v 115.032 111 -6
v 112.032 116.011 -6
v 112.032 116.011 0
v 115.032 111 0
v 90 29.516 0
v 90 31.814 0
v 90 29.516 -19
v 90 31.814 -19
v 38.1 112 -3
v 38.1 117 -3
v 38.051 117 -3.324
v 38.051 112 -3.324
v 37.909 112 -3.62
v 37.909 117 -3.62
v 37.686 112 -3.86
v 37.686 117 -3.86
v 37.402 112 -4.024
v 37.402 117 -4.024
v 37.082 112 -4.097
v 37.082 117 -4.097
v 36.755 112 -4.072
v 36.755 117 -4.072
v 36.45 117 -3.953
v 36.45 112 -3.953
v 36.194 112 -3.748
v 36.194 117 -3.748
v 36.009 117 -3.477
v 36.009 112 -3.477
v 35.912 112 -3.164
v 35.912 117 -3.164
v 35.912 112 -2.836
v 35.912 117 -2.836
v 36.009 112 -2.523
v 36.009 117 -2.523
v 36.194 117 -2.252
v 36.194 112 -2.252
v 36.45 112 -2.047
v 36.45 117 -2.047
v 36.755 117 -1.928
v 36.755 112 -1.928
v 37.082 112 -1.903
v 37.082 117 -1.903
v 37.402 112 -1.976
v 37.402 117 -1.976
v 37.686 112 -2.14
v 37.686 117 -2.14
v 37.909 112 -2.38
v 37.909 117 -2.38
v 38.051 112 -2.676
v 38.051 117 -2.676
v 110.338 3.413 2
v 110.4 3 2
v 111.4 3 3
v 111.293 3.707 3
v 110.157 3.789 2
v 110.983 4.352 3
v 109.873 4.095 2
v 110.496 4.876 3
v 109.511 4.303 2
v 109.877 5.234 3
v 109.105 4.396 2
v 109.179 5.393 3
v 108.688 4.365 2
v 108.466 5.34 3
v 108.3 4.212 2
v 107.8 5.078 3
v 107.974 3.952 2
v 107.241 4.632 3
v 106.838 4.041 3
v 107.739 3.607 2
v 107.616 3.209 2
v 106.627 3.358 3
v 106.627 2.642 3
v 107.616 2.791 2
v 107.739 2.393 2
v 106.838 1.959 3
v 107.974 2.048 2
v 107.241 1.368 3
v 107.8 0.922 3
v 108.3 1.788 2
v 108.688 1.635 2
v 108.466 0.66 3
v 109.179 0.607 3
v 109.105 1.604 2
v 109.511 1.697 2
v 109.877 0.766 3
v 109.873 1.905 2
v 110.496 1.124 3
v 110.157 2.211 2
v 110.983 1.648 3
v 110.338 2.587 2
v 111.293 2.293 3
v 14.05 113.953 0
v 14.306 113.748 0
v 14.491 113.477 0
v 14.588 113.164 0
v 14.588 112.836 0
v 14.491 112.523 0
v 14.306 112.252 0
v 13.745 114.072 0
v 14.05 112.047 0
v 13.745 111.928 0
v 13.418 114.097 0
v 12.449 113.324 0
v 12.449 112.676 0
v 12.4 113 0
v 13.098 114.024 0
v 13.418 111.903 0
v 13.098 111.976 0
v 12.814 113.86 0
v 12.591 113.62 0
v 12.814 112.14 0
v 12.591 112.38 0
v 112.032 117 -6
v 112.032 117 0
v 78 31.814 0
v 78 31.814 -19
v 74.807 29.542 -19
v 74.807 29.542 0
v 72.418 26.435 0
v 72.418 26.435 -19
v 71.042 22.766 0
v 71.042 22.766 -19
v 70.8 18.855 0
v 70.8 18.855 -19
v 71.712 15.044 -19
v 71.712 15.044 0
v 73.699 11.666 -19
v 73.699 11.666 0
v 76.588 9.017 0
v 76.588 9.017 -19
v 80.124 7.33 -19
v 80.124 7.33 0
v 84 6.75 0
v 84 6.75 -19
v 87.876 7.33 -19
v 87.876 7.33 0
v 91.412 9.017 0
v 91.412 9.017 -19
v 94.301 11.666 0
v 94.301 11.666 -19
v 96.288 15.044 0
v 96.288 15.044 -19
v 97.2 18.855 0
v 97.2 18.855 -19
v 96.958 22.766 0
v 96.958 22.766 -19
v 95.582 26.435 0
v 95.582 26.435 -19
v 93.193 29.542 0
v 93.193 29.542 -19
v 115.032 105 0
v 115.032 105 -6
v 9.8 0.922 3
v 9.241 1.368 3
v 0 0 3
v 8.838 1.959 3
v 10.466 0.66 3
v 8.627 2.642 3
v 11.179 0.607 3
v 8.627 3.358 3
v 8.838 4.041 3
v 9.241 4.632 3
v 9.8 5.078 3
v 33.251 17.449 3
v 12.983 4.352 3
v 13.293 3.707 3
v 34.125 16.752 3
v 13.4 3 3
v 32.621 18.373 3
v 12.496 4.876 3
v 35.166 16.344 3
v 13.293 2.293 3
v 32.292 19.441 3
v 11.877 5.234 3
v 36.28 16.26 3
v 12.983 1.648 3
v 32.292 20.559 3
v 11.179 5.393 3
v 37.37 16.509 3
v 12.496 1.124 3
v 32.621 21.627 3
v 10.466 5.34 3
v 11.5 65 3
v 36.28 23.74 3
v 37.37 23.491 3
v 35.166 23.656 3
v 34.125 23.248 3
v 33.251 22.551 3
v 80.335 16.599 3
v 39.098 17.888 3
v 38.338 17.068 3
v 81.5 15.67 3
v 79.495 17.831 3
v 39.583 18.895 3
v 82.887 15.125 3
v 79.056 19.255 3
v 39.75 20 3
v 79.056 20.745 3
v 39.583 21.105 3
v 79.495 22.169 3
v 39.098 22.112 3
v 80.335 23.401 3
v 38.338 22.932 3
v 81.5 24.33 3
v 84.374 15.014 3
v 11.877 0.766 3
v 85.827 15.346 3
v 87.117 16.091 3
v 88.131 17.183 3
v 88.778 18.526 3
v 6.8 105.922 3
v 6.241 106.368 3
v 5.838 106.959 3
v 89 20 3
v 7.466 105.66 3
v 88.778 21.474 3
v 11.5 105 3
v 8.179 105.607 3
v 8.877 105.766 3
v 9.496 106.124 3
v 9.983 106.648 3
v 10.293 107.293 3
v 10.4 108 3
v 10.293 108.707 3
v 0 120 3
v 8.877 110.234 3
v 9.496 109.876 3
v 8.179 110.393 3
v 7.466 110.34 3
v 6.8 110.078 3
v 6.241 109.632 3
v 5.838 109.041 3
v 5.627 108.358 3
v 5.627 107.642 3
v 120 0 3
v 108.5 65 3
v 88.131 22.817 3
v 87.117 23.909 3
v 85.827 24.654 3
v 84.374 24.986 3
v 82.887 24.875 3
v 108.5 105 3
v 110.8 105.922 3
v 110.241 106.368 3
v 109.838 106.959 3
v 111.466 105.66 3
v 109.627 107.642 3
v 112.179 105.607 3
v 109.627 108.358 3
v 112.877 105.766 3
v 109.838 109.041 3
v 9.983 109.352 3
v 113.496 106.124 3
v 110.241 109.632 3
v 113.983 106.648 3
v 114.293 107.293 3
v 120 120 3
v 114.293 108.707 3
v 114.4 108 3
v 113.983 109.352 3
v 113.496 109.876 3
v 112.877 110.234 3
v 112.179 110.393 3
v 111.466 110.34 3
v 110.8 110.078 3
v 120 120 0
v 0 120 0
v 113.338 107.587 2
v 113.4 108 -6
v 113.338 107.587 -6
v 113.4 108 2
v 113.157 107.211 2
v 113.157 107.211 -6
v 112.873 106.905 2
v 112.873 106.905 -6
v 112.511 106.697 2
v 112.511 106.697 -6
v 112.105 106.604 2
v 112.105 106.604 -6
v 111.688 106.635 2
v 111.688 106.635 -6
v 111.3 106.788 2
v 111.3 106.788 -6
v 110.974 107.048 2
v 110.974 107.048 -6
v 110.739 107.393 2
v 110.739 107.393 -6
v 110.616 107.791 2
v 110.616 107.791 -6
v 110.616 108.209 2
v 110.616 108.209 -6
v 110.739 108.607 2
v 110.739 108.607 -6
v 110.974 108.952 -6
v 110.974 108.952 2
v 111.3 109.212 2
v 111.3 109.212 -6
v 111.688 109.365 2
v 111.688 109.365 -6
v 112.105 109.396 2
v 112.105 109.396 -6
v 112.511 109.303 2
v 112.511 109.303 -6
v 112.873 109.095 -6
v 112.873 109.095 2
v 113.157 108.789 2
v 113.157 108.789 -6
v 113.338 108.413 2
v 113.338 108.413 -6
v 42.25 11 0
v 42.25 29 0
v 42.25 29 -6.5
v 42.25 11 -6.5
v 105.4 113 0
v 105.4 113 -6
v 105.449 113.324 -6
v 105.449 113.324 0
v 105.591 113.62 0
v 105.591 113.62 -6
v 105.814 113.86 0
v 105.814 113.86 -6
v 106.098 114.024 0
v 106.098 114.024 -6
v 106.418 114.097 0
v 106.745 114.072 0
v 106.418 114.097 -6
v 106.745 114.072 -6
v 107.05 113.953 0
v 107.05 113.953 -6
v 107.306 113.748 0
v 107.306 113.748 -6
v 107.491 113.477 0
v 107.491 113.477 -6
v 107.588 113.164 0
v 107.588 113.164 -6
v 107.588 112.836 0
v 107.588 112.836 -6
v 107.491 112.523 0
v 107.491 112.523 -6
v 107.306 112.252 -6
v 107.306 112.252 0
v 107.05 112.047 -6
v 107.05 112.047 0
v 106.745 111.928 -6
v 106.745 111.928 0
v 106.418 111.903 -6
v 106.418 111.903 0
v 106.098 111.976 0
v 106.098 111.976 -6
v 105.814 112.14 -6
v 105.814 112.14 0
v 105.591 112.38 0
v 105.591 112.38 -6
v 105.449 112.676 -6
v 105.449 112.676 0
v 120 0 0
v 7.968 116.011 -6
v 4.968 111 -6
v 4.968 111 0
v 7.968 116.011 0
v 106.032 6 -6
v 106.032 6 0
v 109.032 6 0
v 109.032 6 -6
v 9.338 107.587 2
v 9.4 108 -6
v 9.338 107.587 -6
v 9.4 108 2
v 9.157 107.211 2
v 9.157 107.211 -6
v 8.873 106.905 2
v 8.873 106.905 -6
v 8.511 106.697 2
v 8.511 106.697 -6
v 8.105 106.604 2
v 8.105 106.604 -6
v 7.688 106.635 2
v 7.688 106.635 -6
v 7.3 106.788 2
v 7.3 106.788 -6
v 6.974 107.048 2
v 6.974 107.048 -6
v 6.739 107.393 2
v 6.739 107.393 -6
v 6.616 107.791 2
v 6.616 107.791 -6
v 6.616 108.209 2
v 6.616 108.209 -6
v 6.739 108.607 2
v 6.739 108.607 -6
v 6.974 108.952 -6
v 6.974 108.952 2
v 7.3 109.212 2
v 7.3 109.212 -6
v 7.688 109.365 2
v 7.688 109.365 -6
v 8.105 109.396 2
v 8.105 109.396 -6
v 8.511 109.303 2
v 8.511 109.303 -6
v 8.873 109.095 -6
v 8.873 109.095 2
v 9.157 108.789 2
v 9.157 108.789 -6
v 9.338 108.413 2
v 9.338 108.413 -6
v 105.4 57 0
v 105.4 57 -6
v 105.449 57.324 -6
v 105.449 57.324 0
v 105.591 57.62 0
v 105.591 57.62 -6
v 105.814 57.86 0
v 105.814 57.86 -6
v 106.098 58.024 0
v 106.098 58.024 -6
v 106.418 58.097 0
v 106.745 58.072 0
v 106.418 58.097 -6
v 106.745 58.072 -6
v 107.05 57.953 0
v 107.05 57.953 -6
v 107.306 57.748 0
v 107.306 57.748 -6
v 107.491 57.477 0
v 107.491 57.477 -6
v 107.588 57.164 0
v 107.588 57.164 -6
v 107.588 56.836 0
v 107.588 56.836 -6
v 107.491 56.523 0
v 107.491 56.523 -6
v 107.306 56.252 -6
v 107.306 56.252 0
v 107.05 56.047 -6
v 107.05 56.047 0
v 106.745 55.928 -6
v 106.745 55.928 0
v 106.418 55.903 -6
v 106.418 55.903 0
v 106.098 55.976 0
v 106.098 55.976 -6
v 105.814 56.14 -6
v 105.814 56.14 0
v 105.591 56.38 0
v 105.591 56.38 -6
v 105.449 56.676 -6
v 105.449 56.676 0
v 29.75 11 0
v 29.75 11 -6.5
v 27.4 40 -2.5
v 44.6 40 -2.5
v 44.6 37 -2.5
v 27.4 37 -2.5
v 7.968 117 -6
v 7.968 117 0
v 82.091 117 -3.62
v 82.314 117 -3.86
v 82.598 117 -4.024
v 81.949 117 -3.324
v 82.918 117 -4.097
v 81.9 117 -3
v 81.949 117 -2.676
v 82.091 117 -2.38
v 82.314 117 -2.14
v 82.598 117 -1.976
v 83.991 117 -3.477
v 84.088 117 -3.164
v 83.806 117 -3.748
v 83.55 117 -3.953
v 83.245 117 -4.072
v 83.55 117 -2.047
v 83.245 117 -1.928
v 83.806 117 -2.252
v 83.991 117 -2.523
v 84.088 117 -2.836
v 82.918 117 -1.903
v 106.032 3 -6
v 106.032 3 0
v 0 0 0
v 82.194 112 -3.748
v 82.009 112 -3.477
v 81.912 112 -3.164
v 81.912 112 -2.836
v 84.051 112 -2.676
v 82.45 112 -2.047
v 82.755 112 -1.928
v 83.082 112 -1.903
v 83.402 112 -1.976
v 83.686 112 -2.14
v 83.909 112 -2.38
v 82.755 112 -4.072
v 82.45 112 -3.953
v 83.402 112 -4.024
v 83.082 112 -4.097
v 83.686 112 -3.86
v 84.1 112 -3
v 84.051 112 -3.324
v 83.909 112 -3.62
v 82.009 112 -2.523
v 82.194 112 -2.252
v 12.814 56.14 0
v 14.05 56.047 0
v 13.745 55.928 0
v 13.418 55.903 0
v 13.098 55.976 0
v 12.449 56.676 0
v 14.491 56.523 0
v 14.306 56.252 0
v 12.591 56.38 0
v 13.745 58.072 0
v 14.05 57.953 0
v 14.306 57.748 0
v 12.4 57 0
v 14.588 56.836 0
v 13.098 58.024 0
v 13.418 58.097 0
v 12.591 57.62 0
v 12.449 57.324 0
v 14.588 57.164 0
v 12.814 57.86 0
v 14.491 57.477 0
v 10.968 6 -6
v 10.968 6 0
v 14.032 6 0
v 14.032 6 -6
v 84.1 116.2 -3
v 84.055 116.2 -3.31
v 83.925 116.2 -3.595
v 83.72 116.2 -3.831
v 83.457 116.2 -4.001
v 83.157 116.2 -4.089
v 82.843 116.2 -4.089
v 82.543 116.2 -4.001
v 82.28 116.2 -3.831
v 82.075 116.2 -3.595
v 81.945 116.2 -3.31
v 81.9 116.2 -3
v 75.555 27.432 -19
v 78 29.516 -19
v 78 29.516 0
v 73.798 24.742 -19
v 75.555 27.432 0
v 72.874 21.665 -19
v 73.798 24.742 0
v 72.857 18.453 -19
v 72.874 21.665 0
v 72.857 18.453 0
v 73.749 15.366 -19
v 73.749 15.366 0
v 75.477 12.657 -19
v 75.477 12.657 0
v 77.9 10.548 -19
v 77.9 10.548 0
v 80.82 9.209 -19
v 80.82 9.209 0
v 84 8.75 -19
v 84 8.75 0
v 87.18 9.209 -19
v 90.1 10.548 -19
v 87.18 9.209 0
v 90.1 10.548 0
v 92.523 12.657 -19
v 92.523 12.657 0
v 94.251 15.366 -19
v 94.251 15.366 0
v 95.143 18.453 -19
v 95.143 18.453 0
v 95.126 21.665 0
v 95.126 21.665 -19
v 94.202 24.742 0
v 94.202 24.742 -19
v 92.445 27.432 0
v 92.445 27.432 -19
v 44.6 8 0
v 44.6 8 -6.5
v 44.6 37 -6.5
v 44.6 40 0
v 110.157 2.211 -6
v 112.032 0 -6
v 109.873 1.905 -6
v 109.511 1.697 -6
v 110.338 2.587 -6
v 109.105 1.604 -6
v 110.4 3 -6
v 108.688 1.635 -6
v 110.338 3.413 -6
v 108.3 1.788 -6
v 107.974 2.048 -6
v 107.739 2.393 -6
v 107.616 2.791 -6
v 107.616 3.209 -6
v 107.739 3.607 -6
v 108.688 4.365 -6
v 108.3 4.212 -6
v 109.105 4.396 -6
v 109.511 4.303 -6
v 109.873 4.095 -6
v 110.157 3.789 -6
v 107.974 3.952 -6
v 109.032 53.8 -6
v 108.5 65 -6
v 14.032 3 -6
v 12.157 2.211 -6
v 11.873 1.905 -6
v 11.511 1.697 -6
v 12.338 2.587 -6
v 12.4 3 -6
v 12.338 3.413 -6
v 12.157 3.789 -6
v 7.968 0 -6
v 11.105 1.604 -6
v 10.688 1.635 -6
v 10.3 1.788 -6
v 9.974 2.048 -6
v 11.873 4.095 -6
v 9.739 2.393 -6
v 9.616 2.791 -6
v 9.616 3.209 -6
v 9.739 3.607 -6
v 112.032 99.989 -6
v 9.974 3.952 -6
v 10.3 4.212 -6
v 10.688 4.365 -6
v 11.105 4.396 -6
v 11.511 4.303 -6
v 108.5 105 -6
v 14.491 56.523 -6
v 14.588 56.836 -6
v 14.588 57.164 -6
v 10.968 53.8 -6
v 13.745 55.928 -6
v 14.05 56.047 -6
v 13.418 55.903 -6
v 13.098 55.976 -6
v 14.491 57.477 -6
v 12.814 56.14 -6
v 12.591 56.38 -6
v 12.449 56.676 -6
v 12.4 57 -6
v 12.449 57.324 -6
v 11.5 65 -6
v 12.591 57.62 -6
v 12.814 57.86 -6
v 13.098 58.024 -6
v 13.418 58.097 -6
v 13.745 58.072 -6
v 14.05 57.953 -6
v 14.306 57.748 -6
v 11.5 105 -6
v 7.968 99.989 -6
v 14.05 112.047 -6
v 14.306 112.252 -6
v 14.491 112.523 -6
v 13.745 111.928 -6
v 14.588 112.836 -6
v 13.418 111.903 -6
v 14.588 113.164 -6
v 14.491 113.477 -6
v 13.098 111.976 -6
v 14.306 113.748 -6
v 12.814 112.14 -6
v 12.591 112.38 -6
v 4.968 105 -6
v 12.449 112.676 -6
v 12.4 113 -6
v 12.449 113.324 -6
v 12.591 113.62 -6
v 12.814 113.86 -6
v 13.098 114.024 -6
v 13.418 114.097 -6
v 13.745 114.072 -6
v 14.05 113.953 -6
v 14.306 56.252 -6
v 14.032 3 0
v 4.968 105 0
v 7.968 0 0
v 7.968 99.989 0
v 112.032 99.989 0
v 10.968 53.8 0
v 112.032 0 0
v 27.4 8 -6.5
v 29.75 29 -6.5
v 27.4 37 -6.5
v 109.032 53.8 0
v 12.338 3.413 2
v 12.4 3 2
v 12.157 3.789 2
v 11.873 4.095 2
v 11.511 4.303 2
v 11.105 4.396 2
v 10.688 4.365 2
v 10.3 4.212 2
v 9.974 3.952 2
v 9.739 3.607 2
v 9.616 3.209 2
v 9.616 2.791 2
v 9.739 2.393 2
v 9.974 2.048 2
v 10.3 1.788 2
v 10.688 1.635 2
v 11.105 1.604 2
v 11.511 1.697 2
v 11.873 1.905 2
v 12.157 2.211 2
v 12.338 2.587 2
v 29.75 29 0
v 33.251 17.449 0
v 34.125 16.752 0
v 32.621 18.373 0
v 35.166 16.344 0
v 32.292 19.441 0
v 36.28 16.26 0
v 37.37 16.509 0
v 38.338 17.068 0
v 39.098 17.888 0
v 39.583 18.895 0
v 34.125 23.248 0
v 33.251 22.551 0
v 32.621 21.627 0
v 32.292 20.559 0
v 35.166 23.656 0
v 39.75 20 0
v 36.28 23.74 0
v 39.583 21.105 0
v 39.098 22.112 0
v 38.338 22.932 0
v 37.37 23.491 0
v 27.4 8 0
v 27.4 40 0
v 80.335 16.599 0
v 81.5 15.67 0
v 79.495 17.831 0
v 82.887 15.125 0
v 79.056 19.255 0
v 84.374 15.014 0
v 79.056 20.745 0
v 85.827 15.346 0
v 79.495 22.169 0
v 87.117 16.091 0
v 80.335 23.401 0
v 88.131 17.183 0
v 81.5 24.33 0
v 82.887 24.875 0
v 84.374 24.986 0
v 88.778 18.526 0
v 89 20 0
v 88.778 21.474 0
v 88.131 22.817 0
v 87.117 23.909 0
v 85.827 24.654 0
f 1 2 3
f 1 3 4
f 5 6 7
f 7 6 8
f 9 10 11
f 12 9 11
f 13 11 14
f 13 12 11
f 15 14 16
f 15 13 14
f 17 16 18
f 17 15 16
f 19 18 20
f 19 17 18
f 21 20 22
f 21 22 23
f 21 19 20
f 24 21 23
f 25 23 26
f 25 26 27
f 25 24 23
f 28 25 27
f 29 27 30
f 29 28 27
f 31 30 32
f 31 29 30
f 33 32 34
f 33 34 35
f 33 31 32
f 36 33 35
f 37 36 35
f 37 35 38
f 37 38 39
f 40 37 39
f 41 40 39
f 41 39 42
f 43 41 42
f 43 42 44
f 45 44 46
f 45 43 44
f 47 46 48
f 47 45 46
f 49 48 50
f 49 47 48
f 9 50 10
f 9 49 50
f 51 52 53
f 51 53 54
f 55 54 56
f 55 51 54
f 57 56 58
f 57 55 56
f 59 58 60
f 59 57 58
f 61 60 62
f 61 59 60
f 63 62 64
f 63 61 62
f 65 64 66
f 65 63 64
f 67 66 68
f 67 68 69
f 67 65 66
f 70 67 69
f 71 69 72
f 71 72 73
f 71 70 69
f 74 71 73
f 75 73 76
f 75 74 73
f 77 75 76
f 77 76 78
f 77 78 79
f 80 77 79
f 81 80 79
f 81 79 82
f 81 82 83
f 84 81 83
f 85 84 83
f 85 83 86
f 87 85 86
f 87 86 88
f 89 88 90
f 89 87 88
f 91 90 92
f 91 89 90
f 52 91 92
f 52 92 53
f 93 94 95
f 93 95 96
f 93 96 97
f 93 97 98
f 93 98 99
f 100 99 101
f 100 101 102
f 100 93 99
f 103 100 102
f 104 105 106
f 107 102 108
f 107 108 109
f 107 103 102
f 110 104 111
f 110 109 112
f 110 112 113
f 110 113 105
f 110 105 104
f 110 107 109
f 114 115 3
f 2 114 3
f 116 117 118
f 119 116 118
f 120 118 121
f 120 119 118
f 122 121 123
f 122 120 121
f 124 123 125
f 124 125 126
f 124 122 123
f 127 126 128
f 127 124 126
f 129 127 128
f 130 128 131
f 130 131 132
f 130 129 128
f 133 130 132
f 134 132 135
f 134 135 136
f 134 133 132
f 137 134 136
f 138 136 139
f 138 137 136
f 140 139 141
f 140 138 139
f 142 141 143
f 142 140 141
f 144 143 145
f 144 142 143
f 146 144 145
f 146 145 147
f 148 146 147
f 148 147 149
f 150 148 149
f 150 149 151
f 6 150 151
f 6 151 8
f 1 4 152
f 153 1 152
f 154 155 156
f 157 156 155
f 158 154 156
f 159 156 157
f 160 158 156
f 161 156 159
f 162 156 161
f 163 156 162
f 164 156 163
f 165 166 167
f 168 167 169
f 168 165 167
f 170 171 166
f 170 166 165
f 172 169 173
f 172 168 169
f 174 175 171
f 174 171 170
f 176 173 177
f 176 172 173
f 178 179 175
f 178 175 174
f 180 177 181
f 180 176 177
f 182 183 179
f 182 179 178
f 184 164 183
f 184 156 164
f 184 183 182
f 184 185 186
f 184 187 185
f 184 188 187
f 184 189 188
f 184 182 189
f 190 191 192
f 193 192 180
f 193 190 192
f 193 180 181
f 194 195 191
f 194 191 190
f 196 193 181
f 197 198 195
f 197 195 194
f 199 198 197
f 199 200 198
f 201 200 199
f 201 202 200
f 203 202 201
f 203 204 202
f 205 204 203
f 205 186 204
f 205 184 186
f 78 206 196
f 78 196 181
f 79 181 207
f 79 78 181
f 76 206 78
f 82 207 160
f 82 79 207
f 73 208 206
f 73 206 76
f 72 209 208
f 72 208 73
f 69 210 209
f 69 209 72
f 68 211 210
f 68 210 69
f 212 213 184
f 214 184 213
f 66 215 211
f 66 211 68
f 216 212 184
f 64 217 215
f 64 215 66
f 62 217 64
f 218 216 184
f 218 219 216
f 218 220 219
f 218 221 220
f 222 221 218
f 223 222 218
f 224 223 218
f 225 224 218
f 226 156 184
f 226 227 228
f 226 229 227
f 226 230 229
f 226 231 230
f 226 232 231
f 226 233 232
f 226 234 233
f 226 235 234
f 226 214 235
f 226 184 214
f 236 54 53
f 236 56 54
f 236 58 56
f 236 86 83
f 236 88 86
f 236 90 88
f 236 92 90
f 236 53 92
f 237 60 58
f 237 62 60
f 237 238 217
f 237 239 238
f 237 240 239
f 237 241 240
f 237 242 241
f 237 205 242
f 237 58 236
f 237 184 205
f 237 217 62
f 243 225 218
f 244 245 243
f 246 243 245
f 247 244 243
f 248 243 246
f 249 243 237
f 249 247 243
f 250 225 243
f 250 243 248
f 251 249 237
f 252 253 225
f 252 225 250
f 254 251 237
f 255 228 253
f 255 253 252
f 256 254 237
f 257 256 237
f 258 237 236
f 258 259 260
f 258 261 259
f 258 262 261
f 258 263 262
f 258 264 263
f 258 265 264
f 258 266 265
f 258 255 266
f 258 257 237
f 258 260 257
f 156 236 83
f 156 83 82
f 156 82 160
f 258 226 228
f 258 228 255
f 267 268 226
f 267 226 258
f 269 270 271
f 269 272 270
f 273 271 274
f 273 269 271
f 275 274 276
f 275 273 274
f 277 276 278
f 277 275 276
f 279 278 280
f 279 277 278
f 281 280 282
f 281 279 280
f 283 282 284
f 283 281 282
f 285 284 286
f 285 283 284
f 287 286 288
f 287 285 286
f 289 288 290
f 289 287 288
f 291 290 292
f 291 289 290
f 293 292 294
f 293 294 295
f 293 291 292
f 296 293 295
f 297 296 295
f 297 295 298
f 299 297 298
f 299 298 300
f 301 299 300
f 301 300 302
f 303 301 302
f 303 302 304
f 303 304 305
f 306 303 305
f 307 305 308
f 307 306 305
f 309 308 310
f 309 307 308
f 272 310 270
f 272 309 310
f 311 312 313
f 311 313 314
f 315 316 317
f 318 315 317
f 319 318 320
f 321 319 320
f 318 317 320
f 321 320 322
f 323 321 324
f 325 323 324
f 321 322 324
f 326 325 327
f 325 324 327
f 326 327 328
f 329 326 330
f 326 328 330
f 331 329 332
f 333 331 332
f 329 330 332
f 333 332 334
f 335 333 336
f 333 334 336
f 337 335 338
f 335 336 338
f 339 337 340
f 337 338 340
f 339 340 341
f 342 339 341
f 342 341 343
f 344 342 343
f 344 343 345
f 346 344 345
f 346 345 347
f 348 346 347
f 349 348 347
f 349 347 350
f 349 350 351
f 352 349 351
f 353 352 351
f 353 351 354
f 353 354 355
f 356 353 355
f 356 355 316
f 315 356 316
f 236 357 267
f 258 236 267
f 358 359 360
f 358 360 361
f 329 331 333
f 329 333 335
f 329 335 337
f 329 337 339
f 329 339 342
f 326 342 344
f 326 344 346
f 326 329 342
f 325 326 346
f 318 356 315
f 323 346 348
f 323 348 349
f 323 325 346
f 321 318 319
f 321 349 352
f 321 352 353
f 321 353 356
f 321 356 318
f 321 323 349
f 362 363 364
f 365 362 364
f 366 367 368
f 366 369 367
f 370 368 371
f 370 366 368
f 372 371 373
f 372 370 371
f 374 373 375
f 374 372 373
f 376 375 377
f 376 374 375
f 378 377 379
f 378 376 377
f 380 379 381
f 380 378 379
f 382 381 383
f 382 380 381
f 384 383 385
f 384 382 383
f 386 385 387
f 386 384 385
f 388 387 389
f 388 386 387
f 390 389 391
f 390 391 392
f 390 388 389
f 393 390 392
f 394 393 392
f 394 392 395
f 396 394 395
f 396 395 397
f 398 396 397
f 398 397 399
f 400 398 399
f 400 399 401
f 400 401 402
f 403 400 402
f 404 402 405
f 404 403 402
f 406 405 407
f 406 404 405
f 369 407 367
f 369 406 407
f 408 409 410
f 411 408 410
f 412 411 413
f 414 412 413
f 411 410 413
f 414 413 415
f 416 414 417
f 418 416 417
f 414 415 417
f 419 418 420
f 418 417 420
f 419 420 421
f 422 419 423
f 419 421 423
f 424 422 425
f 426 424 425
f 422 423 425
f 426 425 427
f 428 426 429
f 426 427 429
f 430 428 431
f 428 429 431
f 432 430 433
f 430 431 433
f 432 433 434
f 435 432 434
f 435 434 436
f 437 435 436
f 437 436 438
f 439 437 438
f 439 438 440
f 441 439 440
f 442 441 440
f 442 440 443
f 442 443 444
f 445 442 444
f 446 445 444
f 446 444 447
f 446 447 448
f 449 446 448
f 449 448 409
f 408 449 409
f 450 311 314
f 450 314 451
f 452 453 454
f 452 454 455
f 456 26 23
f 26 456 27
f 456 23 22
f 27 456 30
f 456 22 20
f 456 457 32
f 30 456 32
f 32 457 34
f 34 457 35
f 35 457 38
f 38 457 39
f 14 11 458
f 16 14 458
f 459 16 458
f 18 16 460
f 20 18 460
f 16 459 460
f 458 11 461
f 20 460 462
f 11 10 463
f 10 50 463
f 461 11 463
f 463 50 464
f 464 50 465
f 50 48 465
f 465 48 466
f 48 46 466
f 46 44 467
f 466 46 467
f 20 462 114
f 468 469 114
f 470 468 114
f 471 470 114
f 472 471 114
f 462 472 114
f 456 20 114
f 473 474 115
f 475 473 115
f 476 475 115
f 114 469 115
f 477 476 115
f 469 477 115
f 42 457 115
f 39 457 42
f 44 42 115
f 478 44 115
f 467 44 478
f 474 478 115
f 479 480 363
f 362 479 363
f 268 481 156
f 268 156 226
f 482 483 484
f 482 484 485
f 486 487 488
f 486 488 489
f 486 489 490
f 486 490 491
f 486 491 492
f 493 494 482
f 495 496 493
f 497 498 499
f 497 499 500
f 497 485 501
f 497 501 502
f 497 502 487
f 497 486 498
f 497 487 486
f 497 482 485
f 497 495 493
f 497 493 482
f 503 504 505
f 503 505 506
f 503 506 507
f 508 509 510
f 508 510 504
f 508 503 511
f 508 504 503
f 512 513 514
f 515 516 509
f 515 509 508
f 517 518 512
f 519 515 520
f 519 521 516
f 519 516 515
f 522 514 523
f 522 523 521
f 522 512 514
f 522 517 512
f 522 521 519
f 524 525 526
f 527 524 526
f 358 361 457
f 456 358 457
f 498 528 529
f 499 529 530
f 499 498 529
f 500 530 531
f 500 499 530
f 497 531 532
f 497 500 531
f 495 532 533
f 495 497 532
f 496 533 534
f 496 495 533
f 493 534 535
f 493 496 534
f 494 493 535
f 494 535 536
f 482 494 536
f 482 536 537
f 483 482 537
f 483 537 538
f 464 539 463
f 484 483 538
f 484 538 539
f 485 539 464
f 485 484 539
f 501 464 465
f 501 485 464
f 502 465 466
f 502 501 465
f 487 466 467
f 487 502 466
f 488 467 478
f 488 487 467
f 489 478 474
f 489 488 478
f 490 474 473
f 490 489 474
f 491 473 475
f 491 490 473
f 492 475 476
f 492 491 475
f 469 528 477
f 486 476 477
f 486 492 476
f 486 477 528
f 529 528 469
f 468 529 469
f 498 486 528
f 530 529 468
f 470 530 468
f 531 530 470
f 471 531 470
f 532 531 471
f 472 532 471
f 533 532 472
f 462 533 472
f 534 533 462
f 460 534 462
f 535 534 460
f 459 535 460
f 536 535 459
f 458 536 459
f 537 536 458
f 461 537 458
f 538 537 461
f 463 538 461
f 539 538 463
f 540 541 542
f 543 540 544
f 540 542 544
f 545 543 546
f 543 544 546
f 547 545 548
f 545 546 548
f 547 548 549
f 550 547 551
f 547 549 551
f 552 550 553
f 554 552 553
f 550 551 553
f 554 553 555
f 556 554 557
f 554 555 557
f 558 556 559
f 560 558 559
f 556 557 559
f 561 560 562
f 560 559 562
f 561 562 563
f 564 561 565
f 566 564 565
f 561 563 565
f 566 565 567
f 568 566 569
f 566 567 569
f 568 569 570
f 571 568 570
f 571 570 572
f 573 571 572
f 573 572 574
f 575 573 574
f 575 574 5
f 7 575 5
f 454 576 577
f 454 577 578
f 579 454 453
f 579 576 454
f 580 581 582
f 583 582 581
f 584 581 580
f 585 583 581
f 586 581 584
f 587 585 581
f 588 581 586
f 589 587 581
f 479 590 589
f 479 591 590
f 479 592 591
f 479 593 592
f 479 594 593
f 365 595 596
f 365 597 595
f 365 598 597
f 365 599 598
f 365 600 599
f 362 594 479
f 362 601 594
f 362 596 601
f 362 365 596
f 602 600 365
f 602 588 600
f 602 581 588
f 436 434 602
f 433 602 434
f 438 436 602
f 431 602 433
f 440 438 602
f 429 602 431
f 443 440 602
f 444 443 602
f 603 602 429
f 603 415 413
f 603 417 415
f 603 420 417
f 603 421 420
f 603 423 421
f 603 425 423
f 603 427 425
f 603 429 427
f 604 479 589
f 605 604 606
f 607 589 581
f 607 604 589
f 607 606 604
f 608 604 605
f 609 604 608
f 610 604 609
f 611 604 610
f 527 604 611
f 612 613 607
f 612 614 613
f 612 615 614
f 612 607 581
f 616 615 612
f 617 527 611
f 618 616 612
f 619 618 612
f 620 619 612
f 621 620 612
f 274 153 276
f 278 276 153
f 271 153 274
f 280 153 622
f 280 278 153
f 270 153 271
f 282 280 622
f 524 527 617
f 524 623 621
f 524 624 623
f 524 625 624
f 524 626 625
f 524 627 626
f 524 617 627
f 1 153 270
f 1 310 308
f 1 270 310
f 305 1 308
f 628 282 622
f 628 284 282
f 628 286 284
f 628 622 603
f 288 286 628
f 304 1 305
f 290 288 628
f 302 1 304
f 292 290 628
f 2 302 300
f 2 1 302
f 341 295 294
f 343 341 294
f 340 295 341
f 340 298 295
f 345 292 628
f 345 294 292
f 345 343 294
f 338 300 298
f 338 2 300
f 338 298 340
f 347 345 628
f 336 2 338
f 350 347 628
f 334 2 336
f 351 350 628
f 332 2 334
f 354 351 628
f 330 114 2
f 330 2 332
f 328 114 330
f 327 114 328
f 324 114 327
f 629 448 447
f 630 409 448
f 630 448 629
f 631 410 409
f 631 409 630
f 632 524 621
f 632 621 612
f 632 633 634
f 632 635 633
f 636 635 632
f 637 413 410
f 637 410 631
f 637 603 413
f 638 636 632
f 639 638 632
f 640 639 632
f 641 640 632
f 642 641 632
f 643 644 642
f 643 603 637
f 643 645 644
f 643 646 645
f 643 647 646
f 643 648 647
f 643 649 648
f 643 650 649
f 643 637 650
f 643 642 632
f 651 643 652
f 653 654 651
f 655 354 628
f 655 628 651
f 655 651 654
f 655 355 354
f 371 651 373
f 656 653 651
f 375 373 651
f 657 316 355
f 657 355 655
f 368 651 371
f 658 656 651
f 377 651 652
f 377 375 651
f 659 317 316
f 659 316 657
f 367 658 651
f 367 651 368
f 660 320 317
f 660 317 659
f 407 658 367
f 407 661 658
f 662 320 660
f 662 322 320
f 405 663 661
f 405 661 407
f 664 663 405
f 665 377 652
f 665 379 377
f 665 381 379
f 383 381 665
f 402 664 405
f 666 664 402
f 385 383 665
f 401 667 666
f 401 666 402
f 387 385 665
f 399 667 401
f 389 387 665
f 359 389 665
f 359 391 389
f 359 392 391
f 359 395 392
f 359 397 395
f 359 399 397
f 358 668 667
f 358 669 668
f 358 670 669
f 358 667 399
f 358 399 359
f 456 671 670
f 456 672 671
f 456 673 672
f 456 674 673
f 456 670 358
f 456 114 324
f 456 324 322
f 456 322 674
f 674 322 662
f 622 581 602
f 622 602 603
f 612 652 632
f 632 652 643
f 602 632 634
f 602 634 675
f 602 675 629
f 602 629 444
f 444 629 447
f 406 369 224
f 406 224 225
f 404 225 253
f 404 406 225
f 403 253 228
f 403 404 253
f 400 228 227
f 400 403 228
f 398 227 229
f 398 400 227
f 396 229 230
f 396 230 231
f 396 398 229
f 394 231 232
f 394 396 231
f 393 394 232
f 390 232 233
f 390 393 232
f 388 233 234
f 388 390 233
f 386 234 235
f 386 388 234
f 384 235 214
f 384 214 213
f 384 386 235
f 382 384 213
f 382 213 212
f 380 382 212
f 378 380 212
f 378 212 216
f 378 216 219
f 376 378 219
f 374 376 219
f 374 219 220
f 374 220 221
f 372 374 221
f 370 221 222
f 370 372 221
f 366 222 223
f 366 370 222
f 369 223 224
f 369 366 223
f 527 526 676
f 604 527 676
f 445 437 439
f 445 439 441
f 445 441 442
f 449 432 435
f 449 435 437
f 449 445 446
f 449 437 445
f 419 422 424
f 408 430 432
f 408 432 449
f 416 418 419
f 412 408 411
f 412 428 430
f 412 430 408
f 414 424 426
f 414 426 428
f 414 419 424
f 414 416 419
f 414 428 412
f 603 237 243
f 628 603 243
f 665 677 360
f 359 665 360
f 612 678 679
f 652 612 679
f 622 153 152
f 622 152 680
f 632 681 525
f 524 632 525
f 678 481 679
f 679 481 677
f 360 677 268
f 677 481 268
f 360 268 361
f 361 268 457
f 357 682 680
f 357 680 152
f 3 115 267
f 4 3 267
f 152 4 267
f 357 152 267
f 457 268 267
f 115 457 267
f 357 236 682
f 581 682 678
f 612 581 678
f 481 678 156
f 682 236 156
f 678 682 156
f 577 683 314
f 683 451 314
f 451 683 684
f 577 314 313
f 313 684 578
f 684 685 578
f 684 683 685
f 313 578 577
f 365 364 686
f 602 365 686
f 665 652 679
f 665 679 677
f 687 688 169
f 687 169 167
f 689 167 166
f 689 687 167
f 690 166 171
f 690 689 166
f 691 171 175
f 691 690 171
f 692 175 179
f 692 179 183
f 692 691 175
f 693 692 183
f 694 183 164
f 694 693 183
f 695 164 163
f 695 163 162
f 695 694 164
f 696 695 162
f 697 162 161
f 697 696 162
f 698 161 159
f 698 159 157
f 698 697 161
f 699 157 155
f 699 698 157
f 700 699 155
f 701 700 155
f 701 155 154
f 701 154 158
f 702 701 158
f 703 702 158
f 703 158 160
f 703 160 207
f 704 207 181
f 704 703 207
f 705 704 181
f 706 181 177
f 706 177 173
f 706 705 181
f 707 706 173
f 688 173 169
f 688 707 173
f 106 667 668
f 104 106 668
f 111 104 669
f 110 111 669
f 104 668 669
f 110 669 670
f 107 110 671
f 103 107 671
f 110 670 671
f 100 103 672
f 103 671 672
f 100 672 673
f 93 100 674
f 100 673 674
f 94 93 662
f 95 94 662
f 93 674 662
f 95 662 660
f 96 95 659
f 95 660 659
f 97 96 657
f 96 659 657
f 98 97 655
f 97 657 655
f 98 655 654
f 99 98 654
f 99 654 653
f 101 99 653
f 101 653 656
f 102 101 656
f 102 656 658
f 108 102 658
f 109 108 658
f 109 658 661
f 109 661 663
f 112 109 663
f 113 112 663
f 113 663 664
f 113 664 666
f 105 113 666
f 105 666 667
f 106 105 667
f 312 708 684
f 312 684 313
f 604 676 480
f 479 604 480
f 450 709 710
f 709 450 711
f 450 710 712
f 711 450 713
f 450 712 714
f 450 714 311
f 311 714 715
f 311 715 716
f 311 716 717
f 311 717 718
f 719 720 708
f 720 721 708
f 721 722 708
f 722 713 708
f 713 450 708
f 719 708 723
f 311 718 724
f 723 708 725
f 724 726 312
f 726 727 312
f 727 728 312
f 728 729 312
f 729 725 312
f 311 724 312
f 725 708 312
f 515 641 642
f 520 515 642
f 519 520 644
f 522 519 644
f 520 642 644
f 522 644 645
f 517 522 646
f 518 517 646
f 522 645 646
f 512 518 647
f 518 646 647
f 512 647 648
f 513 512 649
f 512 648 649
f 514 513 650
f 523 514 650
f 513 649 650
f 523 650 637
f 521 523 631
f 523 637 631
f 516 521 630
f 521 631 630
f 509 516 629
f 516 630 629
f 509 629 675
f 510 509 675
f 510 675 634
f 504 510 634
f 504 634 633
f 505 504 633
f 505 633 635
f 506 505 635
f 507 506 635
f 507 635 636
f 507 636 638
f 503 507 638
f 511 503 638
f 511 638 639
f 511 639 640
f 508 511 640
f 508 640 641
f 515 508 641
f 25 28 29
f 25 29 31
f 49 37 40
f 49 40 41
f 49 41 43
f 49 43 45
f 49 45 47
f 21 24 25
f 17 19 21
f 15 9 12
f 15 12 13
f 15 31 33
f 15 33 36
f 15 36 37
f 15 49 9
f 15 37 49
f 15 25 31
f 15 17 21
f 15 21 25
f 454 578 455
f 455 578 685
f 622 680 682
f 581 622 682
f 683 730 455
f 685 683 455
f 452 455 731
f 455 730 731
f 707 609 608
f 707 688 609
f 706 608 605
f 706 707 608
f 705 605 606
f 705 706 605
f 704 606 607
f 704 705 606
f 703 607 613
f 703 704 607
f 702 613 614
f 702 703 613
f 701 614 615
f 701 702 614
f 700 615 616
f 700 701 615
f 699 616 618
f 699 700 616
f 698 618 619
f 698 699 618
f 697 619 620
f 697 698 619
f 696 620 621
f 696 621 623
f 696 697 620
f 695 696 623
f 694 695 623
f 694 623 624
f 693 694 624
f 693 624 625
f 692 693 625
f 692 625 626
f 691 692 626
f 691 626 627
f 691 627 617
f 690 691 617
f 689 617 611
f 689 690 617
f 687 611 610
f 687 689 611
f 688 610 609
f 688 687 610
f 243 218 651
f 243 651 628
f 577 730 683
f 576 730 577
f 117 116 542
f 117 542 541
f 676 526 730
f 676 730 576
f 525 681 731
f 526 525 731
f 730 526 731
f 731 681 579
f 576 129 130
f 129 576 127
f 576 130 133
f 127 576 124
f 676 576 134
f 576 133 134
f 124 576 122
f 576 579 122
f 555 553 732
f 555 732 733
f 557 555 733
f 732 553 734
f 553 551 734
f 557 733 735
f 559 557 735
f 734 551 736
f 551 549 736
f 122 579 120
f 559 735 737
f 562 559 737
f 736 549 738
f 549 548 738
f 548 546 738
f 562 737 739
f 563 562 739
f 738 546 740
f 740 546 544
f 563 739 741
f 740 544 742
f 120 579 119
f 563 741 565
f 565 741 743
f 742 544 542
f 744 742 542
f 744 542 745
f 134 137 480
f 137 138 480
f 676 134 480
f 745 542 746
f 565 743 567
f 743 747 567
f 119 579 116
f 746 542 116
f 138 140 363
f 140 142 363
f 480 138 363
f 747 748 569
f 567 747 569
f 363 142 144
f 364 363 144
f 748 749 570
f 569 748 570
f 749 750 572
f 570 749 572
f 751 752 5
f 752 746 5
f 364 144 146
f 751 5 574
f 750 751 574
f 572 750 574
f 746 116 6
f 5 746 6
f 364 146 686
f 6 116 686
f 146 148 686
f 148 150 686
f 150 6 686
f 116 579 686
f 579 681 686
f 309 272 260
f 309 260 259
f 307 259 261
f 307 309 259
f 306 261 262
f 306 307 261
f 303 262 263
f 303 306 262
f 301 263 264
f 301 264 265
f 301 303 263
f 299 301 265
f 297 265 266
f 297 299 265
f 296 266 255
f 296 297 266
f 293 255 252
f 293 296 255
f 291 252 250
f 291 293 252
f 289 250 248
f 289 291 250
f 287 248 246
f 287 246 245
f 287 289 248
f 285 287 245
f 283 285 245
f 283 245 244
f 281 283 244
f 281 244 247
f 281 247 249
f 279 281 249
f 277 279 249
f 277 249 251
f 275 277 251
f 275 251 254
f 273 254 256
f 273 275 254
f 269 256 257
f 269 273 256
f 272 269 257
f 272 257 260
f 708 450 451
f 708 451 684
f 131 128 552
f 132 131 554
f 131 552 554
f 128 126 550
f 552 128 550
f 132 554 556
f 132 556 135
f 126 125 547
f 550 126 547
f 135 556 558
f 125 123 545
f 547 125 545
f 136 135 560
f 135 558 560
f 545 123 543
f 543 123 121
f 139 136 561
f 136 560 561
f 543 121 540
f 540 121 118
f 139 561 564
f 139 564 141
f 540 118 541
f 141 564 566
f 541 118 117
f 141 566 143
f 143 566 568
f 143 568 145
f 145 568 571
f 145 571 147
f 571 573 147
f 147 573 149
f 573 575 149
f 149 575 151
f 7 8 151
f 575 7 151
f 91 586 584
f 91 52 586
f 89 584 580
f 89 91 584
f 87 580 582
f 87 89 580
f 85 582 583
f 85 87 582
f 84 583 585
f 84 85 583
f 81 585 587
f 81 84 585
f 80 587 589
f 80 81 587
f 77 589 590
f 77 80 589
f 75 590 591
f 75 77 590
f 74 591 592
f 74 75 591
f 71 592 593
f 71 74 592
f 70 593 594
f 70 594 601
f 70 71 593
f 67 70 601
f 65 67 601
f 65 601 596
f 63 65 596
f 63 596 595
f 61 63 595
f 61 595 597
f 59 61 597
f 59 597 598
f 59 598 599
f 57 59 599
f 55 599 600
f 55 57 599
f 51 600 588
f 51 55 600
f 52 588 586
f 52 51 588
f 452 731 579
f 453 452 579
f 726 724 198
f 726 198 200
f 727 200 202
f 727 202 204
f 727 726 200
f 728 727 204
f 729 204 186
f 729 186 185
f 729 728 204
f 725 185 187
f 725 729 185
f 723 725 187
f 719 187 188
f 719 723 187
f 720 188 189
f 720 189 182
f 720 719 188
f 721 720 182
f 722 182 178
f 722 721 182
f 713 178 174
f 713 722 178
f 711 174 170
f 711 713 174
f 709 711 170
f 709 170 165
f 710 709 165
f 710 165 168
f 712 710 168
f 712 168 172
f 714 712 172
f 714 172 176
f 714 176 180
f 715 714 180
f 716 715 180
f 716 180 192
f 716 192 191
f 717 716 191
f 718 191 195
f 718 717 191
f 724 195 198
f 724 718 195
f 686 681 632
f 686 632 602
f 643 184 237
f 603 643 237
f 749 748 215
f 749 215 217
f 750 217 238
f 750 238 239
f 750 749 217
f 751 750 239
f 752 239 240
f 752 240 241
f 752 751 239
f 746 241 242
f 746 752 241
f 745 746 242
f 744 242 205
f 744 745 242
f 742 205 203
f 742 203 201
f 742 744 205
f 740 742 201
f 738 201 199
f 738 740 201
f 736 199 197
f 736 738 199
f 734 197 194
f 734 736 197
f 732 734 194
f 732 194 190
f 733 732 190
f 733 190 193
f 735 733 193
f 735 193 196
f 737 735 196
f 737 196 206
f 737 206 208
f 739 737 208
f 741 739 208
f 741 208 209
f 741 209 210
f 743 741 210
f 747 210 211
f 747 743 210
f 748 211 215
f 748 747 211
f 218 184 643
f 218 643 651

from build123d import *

# Parameters (mm, degrees)
SZKIC1_W                        = 120
SZKIC1_H                        = 120
SZKIC1_R                        = 3.75
SZKIC1_R_2                      = 5
SZKIC1_W_2                      = 97
SZKIC1_H_2                      = 40
DODANIE_WYCI_GNI_CIE1_DEPTH     = 3
SZKIC1_4_W                      = 17.2
SZKIC1_4_H                      = 32
DODANIE_WYCI_GNI_CIE3_DEPTH     = 6.5
SZKIC1_7_W                      = 97
SZKIC1_7_H                      = 40
DODANIE_WYCI_GNI_CIE4_DEPTH     = 7
SZKIC9_W                        = 40
SZKIC9_H                        = 4
WYTNIJ_WYCI_GNI_CIE10_DEPTH     = 1
SZKIC7_R                        = 1.4
WYTNIJ_WYCI_GNI_CIE11_DEPTH     = 10
SZKIC1_8_R                      = 13.25
SZKIC1_8_R_2                    = 11.25
DODANIE_WYCI_GNI_CIE5_DEPTH     = 19
SZKIC11_W                       = 17.2
SZKIC11_H                       = 3
WYTNIJ_WYCI_GNI_CIE13_DEPTH     = 4
SZKIC12_W                       = 12
SZKIC12_H                       = 19
WYTNIJ_WYCI_GNI_CIE14_DEPTH     = 4
SZKIC13_R                       = 1.1
WYTNIJ_WYCI_GNI_CIE15_DEPTH     = 7
SZKIC14_W                       = 6
SZKIC14_H                       = 6
SZKIC14_R                       = 1.1
DODANIE_WYCI_GNI_CIE6_DEPTH     = 0.8
DODANIE_WYCI_GNI_CIE7_DEPTH     = 0.8
SFAZOWANIE1_SIZE                = 1
SFAZOWANIE2_SIZE                = 1
SFAZOWANIE3_SIZE                = 1
SFAZOWANIE4_SIZE                = 1
SZKIC17_R                       = 1.4
DODANIE_WYCI_GNI_CIE9_DEPTH     = 6
SZKIC18_W                       = 99.4
SZKIC18_H                       = 63.2
WYTNIJ_WYCI_GNI_CIE16_DEPTH     = 1
WYTNIJ_WYCI_GNI_CIE17_START     = -5
WYTNIJ_WYCI_GNI_CIE17_OUTLINE_R = 1.1
WYTNIJ_WYCI_GNI_CIE17_DEPTH     = 4.2


# Read off the part's stored shape, not the designer's step: Wytnij-wyciągnięcie17
with BuildPart() as part:
    # Szkic1 → Dodanie-wyciągnięcie1 (new body)
    with BuildSketch(Plane.XY):
        with Locations((60, 60)):
            Rectangle(SZKIC1_W, SZKIC1_H)
        with Locations((36, 20)):
            Circle(SZKIC1_R, mode=Mode.SUBTRACT)
        with Locations((84, 20)):
            Circle(SZKIC1_R_2, mode=Mode.SUBTRACT)
        with Locations((60, 85)):
            Rectangle(SZKIC1_W_2, SZKIC1_H_2, mode=Mode.SUBTRACT)
    extrude(amount=DODANIE_WYCI_GNI_CIE1_DEPTH)

    # Szkic1<7> → Dodanie-wyciągnięcie4 (add)
    # profile 1 of 4: a face of its own
    with BuildSketch(Plane.XY):
        Polygon((11.5, 115), (10.3, 115), (10.3, 55), (11.5, 55), (108.5, 55), (109.7, 55), (109.7, 115), (108.5, 115), align=None)
        with Locations((60, 85)):
            Rectangle(SZKIC1_7_W, SZKIC1_7_H, mode=Mode.SUBTRACT)
    # profile 2 of 4: a face of its own
    with BuildSketch(Plane.XY):
        Polygon((11.5, 115), (10.3, 115), (10.3, 55), (11.5, 55), (108.5, 55), (109.7, 55), (109.7, 115), (108.5, 115), align=None)
        with Locations((60, 85)):
            Rectangle(SZKIC1_7_W, SZKIC1_7_H, mode=Mode.SUBTRACT)
    # profile 3 of 4: a face of its own
    with BuildSketch(Plane.XY):
        Polygon((11.5, 115), (10.3, 115), (10.3, 116.2), (109.7, 116.2), (109.7, 115), (108.5, 115), align=None)
    # profile 4 of 4: a face of its own
    with BuildSketch(Plane.XY):
        Polygon((10.3, 53.8), (109.7, 53.8), (109.7, 55), (108.5, 55), (11.5, 55), (10.3, 55), align=None)
    extrude(amount=-DODANIE_WYCI_GNI_CIE4_DEPTH)

    # Szkic9 → Wytnij-wyciągnięcie10 (cut)
    with BuildSketch(Plane(origin=(0, 0, -7), x_dir=(-1, 0, 0), z_dir=(0, 0, -1))):
        with Locations((-40.5, 113)):
            Rectangle(SZKIC9_W, SZKIC9_H)
    extrude(amount=-WYTNIJ_WYCI_GNI_CIE10_DEPTH, mode=Mode.SUBTRACT)

    # Szkic7 → Wytnij-wyciągnięcie11 (cut)
    with BuildSketch(Plane.XY.offset(3)):
        with Locations((11, 3)):
            Circle(SZKIC7_R)
        with Locations((109, 3)):
            Circle(SZKIC7_R)
        with Locations((8, 108)):
            Circle(SZKIC7_R)
        with Locations((112, 108)):
            Circle(SZKIC7_R)
    extrude(amount=-WYTNIJ_WYCI_GNI_CIE11_DEPTH, mode=Mode.SUBTRACT)

    # Szkic1<8> → Dodanie-wyciągnięcie5 (add)
    with BuildSketch(Plane.XY):
        with Locations((84, 20)):
            Circle(SZKIC1_8_R)
        with Locations((84, 20)):
            Circle(SZKIC1_8_R_2, mode=Mode.SUBTRACT)
    extrude(amount=-DODANIE_WYCI_GNI_CIE5_DEPTH)

    # Szkic12 → Wytnij-wyciągnięcie14 (cut)
    with BuildSketch(Plane(origin=(0, 33.25, 0), x_dir=(1, 0, 0), z_dir=(0, 1, 0))):
        with Locations((84, 9.5)):
            Rectangle(SZKIC12_W, SZKIC12_H)
    extrude(amount=-WYTNIJ_WYCI_GNI_CIE14_DEPTH, mode=Mode.SUBTRACT)

    # Szkic13 → Wytnij-wyciągnięcie15 (cut)
    with BuildSketch(Plane(origin=(0, 0, -7), x_dir=(-1, 0, 0), z_dir=(0, 0, -1))):
        with Locations((-106.5, 113)):
            Circle(SZKIC13_R)
        with Locations((-13.5, 113)):
            Circle(SZKIC13_R)
        with Locations((-106.5, 57)):
            Circle(SZKIC13_R)
        with Locations((-13.5, 57)):
            Circle(SZKIC13_R)
    extrude(amount=-WYTNIJ_WYCI_GNI_CIE15_DEPTH, mode=Mode.SUBTRACT)

    # Szkic14 → Dodanie-wyciągnięcie6 (add)
    # profile 1 of 2: a face of its own
    with BuildSketch(Plane(origin=(0, 116.2, 0), x_dir=(1, 0, 0), z_dir=(0, 1, 0))):
        with Locations((37, 3)):
            Rectangle(SZKIC14_W, SZKIC14_H)
        with Locations((37, 3)):
            Circle(SZKIC14_R, mode=Mode.SUBTRACT)
    # profile 2 of 2: a face of its own
    with BuildSketch(Plane(origin=(0, 116.2, 0), x_dir=(1, 0, 0), z_dir=(0, 1, 0))):
        with Locations((83, 3)):
            Rectangle(SZKIC14_W, SZKIC14_H)
        with Locations(Location((83, 3, 0), (0, 0, 180))):
            Circle(SZKIC14_R, mode=Mode.SUBTRACT)
    extrude(amount=DODANIE_WYCI_GNI_CIE6_DEPTH)

    # Szkic15 → Dodanie-wyciągnięcie7 (add)
    with BuildSketch(Plane(origin=(0, 116.2, 0), x_dir=(1, 0, 0), z_dir=(0, 1, 0))):
        Polygon((109.7, 0), (109.7, 7), (10.3, 7), (10.3, 0), (34, 0), (34, 6), (40, 6), (40, 0), (80, 0), (80, 6), (86, 6), (86, 0), align=None)
    extrude(amount=DODANIE_WYCI_GNI_CIE7_DEPTH)

    # Sfazowanie1
    sfazowanie1_edges = [part.edges().sort_by_distance(p)[0] for p in [
        (6.6, 108, 3),
    ]]
    chamfer(sfazowanie1_edges, length=SFAZOWANIE1_SIZE)

    # Sfazowanie2
    sfazowanie2_edges = [part.edges().sort_by_distance(p)[0] for p in [
        (110.6, 108, 3),
    ]]
    chamfer(sfazowanie2_edges, length=SFAZOWANIE2_SIZE)

    # Sfazowanie3
    sfazowanie3_edges = [part.edges().sort_by_distance(p)[0] for p in [
        (9.6, 3, 3),
    ]]
    chamfer(sfazowanie3_edges, length=SFAZOWANIE3_SIZE)

    # Sfazowanie4
    sfazowanie4_edges = [part.edges().sort_by_distance(p)[0] for p in [
        (107.6, 3, 3),
    ]]
    chamfer(sfazowanie4_edges, length=SFAZOWANIE4_SIZE)


with BuildPart() as body_2:
    # Szkic1<4> → Dodanie-wyciągnięcie3 (new body)
    with BuildSketch(Plane.XY):
        with Locations((36, 24)):
            Rectangle(SZKIC1_4_W, SZKIC1_4_H)
        Polygon((29.75, 11), (29.75, 26), (29.75, 29), (42.25, 29), (42.25, 26), (42.25, 11), align=None, mode=Mode.SUBTRACT)
    extrude(amount=-DODANIE_WYCI_GNI_CIE3_DEPTH)

    # Szkic11 → Wytnij-wyciągnięcie13 (cut)
    with BuildSketch(Plane(origin=(0, 0, -6.5), x_dir=(-1, 0, 0), z_dir=(0, 0, -1))):
        with Locations((-36, 38.5)):
            Rectangle(SZKIC11_W, SZKIC11_H)
    extrude(amount=-WYTNIJ_WYCI_GNI_CIE13_DEPTH, mode=Mode.SUBTRACT)


    add(part.part)  # Dodanie-wyciągnięcie9 merges part
    # Szkic17 → Dodanie-wyciągnięcie9 (add)
    with BuildSketch(Plane(origin=(0, 0, 0), x_dir=(-1, 0, 0), z_dir=(0, 0, -1))):
        Polygon((-106.03246961, 3), (-106.03246961, 6), (-109.03246961, 6), (-109.03246961, 117), (-112.03246961, 117), (-112.03246961, 116.010548872), (-115.03246961, 111), (-115.03246961, 105), (-112.03246961, 99.989451128), (-112.03246961, 0), (-7.96753039, 0), (-7.96753039, 99.989451128), (-4.96753039, 105), (-4.96753039, 111), (-7.96753039, 116.010548872), (-7.96753039, 117), (-10.96753039, 117), (-10.96753039, 6), (-14.03246961, 6), (-14.03246961, 3), align=None)
        with Locations(Location((-112, 108, 0), (0, 0, 180))):
            Circle(SZKIC17_R, mode=Mode.SUBTRACT)
        with Locations(Location((-8, 108, 0), (0, 0, 180))):
            Circle(SZKIC17_R, mode=Mode.SUBTRACT)
        with Locations(Location((-11, 3, 0), (0, 0, 180))):
            Circle(SZKIC17_R, mode=Mode.SUBTRACT)
        with Locations(Location((-109, 3, 0), (0, 0, 180))):
            Circle(SZKIC17_R, mode=Mode.SUBTRACT)
    extrude(amount=DODANIE_WYCI_GNI_CIE9_DEPTH)

    # Szkic18 → Wytnij-wyciągnięcie16 (cut)
    with BuildSketch(Plane(origin=(0, 0, -7), x_dir=(-1, 0, 0), z_dir=(0, 0, -1))):
        with Locations((-60, 85.4)):
            Rectangle(SZKIC18_W, SZKIC18_H)
    extrude(amount=-WYTNIJ_WYCI_GNI_CIE16_DEPTH, mode=Mode.SUBTRACT)

    # Wytnij-wyciągnięcie17 outline → Wytnij-wyciągnięcie17 (cut)
    with BuildSketch(Plane(origin=(0, 117, 0), x_dir=(1, 0, 0), z_dir=(0, 1, 0)).offset(WYTNIJ_WYCI_GNI_CIE17_START)):
        with Locations((37, 3)):
            Circle(WYTNIJ_WYCI_GNI_CIE17_OUTLINE_R)
        with Locations((83, 3)):
            Circle(WYTNIJ_WYCI_GNI_CIE17_OUTLINE_R)
    extrude(amount=WYTNIJ_WYCI_GNI_CIE17_DEPTH, mode=Mode.SUBTRACT)


solid = body_2.part
